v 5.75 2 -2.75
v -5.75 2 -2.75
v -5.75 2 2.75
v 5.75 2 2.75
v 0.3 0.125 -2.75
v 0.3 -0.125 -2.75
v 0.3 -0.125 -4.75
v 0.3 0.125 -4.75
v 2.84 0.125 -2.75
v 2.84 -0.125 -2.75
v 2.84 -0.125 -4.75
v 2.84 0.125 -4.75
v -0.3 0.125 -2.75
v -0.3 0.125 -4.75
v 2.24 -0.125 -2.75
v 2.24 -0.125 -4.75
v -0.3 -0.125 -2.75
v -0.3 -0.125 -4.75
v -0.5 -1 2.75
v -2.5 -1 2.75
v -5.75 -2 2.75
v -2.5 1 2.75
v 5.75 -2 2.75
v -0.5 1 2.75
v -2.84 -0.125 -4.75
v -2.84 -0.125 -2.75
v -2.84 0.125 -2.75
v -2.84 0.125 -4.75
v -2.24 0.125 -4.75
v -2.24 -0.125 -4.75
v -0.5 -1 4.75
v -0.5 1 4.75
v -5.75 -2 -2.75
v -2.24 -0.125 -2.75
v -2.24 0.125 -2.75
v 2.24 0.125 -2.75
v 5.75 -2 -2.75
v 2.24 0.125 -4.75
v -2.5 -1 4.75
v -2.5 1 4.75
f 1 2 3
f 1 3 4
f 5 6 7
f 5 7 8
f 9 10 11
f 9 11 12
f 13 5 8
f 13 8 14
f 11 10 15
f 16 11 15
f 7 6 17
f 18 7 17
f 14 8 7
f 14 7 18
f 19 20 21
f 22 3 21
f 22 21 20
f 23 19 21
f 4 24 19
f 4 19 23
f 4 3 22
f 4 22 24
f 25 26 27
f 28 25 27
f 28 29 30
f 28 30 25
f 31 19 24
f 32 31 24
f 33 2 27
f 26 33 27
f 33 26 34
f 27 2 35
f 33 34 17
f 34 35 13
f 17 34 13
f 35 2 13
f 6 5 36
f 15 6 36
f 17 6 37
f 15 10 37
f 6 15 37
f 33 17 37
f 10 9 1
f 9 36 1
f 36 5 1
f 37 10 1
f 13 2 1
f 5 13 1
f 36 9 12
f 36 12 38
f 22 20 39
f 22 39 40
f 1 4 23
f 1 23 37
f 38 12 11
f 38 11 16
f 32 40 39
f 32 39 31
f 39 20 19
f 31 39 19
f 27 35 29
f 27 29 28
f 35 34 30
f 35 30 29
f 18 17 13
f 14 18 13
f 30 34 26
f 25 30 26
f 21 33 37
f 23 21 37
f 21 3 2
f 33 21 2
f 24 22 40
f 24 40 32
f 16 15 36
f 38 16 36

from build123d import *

# Parameters (mm, degrees)
SKETCH1_W           = 11.5
SKETCH1_H           = 5.5
BOSS_EXTRUDE1_DEPTH = 2
SKETCH3_W           = 2
SKETCH3_H           = 2
BOSS_EXTRUDE2_DEPTH = 2
SKETCH5_W           = 0.6
SKETCH5_H           = 0.25
BOSS_EXTRUDE3_DEPTH = 2


with BuildPart() as part:
    # Sketch1 → Boss-Extrude1 (new, symmetric)
    with BuildSketch(Plane(origin=(0, 0, 0), x_dir=(1, 0, 0), z_dir=(0, 1, 0))):
        Rectangle(SKETCH1_W, SKETCH1_H)
    extrude(amount=BOSS_EXTRUDE1_DEPTH, both=True)

    # Sketch3 → Boss-Extrude2 (add)
    with BuildSketch(Plane.XY.offset(2.75)):
        with Locations((-1.5, 0)):
            Rectangle(SKETCH3_W, SKETCH3_H)
    extrude(amount=BOSS_EXTRUDE2_DEPTH)

    # Sketch5 → Boss-Extrude3 (add)
    with BuildSketch(Plane(origin=(0, 0, -2.75), x_dir=(-1, 0, 0), z_dir=(0, 0, -1))):
        with Locations((-2.54, 0)):
            Rectangle(SKETCH5_W, SKETCH5_H)
        Rectangle(SKETCH5_W, SKETCH5_H)
        with Locations((2.54, 0)):
            Rectangle(SKETCH5_W, SKETCH5_H)
    extrude(amount=BOSS_EXTRUDE3_DEPTH)


solid = part.part
